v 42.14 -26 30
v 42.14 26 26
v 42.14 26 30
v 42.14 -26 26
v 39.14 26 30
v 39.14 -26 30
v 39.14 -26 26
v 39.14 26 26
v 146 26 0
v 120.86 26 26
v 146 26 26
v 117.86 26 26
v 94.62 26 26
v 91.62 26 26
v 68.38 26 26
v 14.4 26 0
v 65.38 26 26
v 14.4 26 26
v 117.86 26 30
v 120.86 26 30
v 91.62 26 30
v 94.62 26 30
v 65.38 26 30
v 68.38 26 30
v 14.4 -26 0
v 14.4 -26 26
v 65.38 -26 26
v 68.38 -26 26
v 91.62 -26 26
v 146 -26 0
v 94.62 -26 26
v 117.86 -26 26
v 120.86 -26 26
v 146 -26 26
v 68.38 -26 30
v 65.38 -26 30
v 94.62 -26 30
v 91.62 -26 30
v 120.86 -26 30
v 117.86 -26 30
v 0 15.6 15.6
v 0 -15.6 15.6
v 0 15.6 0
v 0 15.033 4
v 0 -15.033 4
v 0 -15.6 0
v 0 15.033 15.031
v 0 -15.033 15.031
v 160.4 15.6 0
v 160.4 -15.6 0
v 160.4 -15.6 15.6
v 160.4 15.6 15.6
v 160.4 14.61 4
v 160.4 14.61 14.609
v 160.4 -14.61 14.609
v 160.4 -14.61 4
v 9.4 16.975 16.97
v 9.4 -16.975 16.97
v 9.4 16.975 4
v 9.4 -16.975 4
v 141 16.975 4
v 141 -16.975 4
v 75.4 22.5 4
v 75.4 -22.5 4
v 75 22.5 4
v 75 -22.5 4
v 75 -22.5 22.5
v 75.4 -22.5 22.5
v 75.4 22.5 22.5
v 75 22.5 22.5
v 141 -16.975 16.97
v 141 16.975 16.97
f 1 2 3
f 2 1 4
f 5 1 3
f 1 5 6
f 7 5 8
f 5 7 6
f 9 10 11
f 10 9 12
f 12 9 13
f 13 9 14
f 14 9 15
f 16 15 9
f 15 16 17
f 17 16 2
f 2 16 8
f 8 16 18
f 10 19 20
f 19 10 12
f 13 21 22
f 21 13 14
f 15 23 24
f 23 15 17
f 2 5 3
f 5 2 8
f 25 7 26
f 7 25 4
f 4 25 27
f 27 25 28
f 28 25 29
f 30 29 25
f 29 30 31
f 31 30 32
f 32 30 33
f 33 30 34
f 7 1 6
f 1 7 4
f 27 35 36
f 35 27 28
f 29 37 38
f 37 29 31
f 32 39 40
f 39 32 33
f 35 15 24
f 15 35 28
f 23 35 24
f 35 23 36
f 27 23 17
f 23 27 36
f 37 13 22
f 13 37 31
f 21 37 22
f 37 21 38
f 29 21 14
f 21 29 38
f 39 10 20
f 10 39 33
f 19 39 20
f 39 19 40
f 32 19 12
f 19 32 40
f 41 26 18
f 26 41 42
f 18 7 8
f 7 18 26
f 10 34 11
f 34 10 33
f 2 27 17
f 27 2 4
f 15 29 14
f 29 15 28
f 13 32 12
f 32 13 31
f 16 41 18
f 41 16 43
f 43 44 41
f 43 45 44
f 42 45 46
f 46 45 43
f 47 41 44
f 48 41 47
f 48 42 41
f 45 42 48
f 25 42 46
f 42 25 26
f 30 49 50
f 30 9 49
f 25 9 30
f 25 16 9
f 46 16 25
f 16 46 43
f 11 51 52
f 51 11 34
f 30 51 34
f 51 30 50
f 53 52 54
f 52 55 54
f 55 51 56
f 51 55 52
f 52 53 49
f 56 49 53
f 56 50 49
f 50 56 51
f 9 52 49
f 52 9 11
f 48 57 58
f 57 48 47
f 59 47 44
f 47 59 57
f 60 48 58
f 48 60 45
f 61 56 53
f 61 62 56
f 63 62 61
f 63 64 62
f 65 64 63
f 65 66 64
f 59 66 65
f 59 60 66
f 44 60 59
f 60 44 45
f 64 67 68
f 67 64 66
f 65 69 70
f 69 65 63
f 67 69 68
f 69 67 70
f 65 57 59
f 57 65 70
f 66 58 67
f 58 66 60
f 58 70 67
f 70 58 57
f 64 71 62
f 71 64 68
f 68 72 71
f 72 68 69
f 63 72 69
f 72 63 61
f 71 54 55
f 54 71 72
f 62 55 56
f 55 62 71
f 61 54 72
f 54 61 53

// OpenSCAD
$fn = 32;

// ----------------------------------------------------------------------
// Faired channel: 160 x 52 x 26 mm, 3.5 mm walls, faired ends
// ----------------------------------------------------------------------

// --- parameters (mm) ---
length = 160;             // channel length
width = 52;               // channel width at mid length
height = 26;              // channel height at mid length
wall = 3.5;               // side wall thickness
floor_t = 4;              // floor thickness
end_w = 31.2;             // faired end width
end_h = 15.6;             // faired end height
ribs = 4;                 // stiffening ribs on the top
rib_t = 3;                // rib thickness
rib_h = 4;                // rib height

difference() {
  union() {
    hull() {
      translate([0, -15.6, 0]) cube([0.4, 31.2, 15.6]);
      translate([14.4, -26, 0]) cube([0.4, 52, 26]);
    }
    hull() {
      translate([14.4, -26, 0]) cube([0.4, 52, 26]);
      translate([80, -26, 0]) cube([0.4, 52, 26]);
    }
    hull() {
      translate([80, -26, 0]) cube([0.4, 52, 26]);
      translate([145.6, -26, 0]) cube([0.4, 52, 26]);
    }
    hull() {
      translate([145.6, -26, 0]) cube([0.4, 52, 26]);
      translate([160, -15.6, 0]) cube([0.4, 31.2, 15.6]);
    }
    /* stiffening ribs across the flat top, sunk 0.8 mm into it */
    for (i = [1 : ribs]) {
      translate([14.4 + i * (length - 2 * 14.4) / (ribs + 1) - rib_t / 2, -width / 2, height - 0.8]) cube([rib_t, width, rib_h + 0.8]);
    }
  }
  /* cavity, 5 mm proud of both ends so the ports are cut clean */
  hull() {
    translate([-5, -14, 4]) cube([0.4, 28, 10]);
    translate([9.4, -16.975, 4]) cube([0.4, 33.95, 12.97]);
  }
  hull() {
    translate([9.4, -16.975, 4]) cube([0.4, 33.95, 12.97]);
    translate([75, -22.5, 4]) cube([0.4, 45, 18.5]);
  }
  hull() {
    translate([75, -22.5, 4]) cube([0.4, 45, 18.5]);
    translate([140.6, -16.975, 4]) cube([0.4, 33.95, 12.97]);
  }
  hull() {
    translate([140.6, -16.975, 4]) cube([0.4, 33.95, 12.97]);
    translate([165, -14, 4]) cube([0.4, 28, 10]);
  }
}
